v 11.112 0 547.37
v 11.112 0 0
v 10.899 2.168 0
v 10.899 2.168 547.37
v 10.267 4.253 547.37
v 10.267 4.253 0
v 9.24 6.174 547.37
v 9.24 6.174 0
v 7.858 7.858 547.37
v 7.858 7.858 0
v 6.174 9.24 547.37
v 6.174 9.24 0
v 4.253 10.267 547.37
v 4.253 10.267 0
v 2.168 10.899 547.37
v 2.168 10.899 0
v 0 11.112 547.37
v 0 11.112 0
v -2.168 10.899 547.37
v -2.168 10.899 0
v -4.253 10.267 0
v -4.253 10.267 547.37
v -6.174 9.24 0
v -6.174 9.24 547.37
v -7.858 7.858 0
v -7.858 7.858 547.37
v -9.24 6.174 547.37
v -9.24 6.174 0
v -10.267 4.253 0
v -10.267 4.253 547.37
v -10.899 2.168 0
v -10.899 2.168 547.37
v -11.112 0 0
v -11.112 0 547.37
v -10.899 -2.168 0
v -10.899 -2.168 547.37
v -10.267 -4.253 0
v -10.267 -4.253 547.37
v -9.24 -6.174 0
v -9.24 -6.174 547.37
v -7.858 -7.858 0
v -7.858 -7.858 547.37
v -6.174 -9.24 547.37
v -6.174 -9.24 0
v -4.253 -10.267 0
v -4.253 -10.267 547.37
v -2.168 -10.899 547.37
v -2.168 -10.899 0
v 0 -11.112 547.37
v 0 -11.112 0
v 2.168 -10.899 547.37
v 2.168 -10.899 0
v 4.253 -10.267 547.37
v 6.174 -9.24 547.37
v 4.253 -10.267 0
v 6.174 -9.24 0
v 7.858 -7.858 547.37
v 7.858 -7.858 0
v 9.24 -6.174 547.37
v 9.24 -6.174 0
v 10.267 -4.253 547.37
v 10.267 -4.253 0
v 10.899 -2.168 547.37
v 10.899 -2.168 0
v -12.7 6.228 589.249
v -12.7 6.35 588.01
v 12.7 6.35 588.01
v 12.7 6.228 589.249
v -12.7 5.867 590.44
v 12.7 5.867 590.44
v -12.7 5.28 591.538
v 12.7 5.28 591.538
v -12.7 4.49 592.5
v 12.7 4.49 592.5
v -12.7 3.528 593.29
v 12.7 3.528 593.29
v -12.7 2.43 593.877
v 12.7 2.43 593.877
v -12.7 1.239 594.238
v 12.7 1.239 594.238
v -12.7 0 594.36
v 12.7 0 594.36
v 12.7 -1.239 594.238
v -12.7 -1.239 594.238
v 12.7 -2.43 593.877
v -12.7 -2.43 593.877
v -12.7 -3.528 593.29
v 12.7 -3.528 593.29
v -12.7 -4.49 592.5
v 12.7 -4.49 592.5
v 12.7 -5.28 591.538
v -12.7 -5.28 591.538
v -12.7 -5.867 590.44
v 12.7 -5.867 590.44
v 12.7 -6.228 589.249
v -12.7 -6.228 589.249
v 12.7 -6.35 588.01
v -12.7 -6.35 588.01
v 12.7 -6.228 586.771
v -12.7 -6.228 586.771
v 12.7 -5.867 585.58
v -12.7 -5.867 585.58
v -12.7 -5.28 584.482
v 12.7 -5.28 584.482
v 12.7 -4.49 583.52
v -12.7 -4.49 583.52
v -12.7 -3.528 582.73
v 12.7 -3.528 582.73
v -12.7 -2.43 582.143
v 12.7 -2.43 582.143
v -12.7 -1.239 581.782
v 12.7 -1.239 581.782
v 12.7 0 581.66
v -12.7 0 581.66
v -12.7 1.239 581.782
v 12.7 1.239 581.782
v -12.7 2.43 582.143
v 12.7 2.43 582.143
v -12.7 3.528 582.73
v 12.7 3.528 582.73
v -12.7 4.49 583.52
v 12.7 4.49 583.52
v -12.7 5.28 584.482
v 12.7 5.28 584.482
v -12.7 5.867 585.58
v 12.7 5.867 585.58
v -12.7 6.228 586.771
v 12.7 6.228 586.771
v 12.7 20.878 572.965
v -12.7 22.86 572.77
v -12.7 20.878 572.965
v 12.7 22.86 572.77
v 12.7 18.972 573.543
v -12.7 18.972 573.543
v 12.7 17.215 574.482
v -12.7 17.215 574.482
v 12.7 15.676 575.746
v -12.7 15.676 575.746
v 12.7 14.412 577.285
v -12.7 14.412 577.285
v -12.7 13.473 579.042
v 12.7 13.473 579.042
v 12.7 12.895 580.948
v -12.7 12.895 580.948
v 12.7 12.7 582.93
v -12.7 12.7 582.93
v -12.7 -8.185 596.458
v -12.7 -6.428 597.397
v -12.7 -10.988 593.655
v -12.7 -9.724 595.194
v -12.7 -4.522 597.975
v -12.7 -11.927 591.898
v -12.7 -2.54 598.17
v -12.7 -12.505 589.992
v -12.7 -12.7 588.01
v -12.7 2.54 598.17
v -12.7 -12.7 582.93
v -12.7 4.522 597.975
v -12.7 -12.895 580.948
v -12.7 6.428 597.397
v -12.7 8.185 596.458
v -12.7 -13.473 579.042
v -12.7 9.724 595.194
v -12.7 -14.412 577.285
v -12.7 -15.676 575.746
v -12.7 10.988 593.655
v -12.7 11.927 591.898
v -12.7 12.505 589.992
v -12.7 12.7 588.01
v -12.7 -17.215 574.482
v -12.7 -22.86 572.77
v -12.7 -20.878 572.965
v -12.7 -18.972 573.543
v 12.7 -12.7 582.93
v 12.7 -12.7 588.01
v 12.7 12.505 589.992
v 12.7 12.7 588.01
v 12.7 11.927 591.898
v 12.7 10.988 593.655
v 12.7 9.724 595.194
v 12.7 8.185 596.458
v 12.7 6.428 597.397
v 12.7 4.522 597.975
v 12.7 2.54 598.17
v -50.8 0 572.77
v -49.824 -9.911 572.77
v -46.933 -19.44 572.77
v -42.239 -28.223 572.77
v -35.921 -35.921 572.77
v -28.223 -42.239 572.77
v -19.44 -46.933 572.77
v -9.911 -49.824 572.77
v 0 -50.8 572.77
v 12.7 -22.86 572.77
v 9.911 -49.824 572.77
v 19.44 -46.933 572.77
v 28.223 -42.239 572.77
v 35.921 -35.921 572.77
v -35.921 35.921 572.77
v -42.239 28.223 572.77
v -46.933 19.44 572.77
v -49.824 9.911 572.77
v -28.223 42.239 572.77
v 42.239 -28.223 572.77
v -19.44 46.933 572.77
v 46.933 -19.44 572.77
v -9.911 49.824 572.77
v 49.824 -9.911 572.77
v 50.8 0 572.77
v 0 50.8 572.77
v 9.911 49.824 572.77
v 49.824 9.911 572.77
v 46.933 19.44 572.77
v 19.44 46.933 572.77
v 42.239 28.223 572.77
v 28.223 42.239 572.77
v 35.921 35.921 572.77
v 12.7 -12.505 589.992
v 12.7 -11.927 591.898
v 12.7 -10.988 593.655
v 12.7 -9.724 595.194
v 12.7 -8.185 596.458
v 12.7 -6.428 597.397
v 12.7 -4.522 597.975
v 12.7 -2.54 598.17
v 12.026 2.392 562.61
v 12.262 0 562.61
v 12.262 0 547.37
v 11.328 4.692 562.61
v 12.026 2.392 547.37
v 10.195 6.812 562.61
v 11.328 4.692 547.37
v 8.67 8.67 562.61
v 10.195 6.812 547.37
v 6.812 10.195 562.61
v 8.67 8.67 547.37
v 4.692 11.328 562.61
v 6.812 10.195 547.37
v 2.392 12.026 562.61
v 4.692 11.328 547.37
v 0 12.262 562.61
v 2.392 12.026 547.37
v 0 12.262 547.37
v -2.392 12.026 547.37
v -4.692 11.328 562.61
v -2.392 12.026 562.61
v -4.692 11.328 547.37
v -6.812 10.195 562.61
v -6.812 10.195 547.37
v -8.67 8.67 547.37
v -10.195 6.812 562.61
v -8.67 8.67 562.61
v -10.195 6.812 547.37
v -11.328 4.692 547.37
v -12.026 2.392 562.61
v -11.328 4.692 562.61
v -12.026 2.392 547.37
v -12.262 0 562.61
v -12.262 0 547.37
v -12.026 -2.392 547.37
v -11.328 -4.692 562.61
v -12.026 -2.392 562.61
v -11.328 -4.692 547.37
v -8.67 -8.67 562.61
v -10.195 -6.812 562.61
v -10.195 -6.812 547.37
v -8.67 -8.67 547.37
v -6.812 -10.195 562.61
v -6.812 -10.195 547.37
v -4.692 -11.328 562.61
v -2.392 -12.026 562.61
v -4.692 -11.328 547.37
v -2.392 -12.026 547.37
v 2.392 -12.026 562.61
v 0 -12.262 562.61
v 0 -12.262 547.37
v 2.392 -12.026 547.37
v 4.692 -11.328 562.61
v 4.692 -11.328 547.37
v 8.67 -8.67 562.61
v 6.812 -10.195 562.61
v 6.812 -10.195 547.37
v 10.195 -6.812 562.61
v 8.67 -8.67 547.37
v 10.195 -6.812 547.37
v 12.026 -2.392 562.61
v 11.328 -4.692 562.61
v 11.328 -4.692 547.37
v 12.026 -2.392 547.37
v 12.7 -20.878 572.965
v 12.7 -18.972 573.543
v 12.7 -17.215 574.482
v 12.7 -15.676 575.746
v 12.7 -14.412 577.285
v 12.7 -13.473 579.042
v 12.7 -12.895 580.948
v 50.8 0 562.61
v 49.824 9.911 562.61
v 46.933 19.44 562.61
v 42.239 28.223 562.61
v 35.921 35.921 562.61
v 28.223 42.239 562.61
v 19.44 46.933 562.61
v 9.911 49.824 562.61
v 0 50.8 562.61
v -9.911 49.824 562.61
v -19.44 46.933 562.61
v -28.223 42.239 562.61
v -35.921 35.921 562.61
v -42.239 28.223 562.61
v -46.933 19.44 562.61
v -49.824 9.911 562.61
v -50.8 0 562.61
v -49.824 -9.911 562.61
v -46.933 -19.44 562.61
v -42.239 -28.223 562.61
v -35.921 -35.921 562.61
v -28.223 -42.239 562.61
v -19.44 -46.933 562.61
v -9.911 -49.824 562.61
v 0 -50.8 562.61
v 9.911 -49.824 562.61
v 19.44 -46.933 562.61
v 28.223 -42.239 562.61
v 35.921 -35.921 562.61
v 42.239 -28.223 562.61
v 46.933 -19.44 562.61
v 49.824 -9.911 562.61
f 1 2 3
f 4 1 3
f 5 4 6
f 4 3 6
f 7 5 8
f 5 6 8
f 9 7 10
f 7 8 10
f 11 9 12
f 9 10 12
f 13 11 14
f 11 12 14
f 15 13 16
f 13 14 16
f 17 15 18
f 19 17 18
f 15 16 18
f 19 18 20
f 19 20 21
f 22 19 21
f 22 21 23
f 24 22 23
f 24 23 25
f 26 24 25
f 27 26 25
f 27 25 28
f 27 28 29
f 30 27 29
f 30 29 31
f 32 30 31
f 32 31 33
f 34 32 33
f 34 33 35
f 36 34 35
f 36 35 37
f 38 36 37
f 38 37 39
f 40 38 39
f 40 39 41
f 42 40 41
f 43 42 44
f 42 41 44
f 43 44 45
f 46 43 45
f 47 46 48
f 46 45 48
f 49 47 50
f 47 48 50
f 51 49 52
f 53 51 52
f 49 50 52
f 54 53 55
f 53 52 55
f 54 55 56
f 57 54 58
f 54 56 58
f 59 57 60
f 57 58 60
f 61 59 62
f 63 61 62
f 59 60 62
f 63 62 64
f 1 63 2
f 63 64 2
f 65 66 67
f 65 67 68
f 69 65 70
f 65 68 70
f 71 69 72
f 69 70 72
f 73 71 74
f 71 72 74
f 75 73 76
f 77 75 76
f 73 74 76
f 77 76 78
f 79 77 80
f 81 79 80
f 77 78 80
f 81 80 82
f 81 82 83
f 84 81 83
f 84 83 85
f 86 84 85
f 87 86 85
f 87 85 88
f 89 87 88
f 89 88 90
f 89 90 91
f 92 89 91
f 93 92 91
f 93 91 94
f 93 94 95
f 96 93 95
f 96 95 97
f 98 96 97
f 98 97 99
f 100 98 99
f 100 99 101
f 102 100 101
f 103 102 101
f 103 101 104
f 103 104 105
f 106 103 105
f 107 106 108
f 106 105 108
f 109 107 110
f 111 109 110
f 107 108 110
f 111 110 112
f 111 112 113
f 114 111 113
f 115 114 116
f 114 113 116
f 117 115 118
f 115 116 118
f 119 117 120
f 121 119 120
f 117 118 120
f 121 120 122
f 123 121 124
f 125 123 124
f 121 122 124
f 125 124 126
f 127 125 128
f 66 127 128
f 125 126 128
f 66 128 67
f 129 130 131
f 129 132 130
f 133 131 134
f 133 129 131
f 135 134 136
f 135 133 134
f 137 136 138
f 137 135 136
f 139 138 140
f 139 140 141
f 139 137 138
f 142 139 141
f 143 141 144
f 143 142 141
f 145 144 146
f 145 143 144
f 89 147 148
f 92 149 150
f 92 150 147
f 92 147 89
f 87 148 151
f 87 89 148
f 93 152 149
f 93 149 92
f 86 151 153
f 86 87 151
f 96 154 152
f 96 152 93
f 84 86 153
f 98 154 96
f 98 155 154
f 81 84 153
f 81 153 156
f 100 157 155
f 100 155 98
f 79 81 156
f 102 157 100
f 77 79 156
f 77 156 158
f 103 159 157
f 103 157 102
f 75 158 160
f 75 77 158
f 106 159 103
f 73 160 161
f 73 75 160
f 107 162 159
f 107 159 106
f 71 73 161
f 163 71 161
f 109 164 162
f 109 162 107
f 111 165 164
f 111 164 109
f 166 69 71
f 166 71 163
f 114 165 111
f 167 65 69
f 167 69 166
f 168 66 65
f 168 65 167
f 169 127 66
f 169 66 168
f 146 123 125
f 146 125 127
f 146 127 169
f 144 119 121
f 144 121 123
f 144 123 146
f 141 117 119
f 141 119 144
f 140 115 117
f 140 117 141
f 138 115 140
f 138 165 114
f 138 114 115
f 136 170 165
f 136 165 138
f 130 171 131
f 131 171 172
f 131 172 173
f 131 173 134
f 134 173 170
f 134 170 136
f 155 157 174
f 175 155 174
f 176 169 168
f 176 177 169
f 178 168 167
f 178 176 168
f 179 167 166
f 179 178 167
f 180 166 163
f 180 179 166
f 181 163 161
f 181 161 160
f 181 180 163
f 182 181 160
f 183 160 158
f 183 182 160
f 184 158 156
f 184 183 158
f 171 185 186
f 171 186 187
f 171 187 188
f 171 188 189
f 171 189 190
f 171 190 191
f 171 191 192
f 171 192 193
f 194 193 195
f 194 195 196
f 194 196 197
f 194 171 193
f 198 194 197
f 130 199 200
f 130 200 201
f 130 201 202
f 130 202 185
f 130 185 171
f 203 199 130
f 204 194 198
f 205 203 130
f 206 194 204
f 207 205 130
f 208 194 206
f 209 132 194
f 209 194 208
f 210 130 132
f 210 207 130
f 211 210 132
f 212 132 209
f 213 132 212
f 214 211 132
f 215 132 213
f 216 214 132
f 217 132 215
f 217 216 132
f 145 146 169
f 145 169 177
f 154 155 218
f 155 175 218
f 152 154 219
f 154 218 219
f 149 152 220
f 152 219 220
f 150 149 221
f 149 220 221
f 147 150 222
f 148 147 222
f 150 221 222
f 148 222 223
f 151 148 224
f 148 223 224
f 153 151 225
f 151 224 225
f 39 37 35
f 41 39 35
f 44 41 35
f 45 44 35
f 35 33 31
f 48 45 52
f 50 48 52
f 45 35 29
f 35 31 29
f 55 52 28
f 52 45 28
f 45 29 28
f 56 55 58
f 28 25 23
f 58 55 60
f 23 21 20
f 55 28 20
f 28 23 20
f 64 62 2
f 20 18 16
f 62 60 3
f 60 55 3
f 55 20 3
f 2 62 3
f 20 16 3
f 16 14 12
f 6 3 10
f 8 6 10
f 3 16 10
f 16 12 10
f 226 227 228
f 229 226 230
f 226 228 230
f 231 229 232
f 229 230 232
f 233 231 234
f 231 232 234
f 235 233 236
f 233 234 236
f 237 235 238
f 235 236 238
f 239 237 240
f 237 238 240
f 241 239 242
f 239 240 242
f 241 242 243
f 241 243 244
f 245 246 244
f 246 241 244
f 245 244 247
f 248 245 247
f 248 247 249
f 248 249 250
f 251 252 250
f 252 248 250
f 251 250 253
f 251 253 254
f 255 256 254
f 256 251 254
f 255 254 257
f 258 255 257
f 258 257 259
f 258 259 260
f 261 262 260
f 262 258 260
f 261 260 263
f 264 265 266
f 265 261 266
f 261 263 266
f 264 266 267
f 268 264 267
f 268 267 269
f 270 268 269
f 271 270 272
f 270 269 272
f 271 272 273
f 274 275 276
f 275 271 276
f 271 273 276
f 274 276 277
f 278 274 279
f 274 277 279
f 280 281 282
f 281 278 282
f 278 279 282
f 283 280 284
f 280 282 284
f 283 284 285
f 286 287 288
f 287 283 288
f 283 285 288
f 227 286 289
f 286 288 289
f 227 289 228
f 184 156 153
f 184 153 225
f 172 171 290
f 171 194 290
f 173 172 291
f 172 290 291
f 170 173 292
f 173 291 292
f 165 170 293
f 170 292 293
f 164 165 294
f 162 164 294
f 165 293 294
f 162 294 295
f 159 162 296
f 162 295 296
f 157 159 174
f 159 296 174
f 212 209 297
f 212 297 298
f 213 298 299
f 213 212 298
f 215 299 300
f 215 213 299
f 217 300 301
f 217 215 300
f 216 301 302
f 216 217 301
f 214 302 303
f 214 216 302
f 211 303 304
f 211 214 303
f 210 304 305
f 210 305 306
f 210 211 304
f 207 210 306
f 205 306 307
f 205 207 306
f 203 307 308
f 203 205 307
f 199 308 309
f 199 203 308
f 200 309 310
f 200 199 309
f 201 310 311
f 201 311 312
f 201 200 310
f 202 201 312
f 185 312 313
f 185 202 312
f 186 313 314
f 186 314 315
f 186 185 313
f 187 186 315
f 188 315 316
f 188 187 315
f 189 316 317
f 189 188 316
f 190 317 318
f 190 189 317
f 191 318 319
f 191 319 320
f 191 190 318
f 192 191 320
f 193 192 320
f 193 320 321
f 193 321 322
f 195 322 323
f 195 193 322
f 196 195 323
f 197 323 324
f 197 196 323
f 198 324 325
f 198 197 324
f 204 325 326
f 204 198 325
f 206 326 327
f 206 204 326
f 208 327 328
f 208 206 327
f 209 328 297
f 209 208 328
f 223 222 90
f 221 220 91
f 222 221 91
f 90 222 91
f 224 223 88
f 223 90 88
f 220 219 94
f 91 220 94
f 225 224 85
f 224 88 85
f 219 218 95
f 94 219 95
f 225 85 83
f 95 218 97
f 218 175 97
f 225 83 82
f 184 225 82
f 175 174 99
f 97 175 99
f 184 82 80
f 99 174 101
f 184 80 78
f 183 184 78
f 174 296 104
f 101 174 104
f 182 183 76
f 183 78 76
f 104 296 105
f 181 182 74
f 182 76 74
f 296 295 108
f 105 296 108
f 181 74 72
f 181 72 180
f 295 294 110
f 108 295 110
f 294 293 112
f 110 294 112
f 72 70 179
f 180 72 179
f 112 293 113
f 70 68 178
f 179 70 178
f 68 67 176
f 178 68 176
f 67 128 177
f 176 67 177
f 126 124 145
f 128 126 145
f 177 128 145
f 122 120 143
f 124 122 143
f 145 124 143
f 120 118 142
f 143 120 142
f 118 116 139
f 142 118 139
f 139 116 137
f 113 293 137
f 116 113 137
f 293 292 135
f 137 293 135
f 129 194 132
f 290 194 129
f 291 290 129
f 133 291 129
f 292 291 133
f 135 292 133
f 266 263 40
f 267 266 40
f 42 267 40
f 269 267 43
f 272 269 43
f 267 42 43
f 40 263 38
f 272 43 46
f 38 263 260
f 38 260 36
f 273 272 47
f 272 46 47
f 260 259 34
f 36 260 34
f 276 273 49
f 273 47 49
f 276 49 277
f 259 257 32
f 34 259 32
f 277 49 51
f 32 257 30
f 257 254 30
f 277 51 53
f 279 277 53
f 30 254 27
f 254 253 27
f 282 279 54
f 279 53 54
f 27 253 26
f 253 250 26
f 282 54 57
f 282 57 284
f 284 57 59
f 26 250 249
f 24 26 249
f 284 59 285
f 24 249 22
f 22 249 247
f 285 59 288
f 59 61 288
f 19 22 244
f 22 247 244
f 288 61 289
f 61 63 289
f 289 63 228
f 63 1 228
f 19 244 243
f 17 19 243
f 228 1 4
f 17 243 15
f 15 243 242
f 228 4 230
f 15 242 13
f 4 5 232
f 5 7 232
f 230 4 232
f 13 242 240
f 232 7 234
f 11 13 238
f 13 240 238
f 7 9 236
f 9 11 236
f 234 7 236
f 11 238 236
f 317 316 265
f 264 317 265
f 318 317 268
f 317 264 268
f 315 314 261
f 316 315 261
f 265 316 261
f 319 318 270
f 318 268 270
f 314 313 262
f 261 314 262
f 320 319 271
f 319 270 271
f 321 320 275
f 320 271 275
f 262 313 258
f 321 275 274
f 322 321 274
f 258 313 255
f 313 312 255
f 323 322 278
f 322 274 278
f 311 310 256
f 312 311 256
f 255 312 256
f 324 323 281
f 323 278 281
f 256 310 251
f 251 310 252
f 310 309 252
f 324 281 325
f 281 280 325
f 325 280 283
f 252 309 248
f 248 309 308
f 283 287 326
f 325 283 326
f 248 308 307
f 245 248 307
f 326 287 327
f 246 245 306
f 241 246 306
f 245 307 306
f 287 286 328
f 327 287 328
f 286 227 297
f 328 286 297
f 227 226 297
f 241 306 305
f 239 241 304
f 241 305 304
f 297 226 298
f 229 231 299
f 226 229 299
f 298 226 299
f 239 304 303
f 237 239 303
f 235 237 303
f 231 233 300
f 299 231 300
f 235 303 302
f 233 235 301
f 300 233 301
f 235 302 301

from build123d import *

# Parameters (mm, degrees)
SKETCH1_R           = 11.1125
BOSS_EXTRUDE1_DEPTH = 572.77
BOSS_EXTRUDE2_START = -25.4
SKETCH2_R           = 12.261678201
SKETCH2_R_2         = 11.1125
BOSS_EXTRUDE2_DEPTH = 25.4
SKETCH6_W           = 25.4
SKETCH6_H           = 25.4
BOSS_EXTRUDE3_DEPTH = 25.4
SKETCH7_R           = 6.35
CUT_EXTRUDE1_DEPTH  = 50.8
SKETCH8_R           = 50.8
BOSS_EXTRUDE4_DEPTH = 10.16
FILLET1_R           = 10.16


with BuildPart() as part:
    # Sketch1 → Boss-Extrude1 (new body)
    with BuildSketch(Plane.XY):
        Circle(SKETCH1_R)
    extrude(amount=BOSS_EXTRUDE1_DEPTH)

    # Sketch2 → Boss-Extrude2 (add)
    with BuildSketch(Plane.XY.offset(572.77).offset(BOSS_EXTRUDE2_START)):
        Circle(SKETCH2_R)
        Circle(SKETCH2_R_2, mode=Mode.SUBTRACT)
    extrude(amount=BOSS_EXTRUDE2_DEPTH)

    # Sketch6 → Boss-Extrude3 (add)
    with BuildSketch(Plane.XY.offset(572.77)):
        Rectangle(SKETCH6_W, SKETCH6_H)
    extrude(amount=BOSS_EXTRUDE3_DEPTH)

    # Sketch7 → Cut-Extrude1 (cut)
    with BuildSketch(Plane(origin=(12.7, 0, 0), x_dir=(0, 0, -1), z_dir=(1, 0, 0))):
        with Locations(Location((-588.01, 0, 0), (0, 0, 90))):
            Circle(SKETCH7_R)
    extrude(amount=-CUT_EXTRUDE1_DEPTH, mode=Mode.SUBTRACT)

    # Sketch8 → Boss-Extrude4 (add)
    with BuildSketch(Plane.XY.offset(572.77)):
        Circle(SKETCH8_R)
    extrude(amount=-BOSS_EXTRUDE4_DEPTH)

    # Fillet1
    fillet1_edges = [part.edges().sort_by_distance(p)[0] for p in [
        (0, 12.7, 572.77),
        (0, -12.7, 572.77),
        (0, 12.7, 598.17),
        (0, -12.7, 598.17),
    ]]
    fillet(fillet1_edges, radius=FILLET1_R)


solid = part.part
